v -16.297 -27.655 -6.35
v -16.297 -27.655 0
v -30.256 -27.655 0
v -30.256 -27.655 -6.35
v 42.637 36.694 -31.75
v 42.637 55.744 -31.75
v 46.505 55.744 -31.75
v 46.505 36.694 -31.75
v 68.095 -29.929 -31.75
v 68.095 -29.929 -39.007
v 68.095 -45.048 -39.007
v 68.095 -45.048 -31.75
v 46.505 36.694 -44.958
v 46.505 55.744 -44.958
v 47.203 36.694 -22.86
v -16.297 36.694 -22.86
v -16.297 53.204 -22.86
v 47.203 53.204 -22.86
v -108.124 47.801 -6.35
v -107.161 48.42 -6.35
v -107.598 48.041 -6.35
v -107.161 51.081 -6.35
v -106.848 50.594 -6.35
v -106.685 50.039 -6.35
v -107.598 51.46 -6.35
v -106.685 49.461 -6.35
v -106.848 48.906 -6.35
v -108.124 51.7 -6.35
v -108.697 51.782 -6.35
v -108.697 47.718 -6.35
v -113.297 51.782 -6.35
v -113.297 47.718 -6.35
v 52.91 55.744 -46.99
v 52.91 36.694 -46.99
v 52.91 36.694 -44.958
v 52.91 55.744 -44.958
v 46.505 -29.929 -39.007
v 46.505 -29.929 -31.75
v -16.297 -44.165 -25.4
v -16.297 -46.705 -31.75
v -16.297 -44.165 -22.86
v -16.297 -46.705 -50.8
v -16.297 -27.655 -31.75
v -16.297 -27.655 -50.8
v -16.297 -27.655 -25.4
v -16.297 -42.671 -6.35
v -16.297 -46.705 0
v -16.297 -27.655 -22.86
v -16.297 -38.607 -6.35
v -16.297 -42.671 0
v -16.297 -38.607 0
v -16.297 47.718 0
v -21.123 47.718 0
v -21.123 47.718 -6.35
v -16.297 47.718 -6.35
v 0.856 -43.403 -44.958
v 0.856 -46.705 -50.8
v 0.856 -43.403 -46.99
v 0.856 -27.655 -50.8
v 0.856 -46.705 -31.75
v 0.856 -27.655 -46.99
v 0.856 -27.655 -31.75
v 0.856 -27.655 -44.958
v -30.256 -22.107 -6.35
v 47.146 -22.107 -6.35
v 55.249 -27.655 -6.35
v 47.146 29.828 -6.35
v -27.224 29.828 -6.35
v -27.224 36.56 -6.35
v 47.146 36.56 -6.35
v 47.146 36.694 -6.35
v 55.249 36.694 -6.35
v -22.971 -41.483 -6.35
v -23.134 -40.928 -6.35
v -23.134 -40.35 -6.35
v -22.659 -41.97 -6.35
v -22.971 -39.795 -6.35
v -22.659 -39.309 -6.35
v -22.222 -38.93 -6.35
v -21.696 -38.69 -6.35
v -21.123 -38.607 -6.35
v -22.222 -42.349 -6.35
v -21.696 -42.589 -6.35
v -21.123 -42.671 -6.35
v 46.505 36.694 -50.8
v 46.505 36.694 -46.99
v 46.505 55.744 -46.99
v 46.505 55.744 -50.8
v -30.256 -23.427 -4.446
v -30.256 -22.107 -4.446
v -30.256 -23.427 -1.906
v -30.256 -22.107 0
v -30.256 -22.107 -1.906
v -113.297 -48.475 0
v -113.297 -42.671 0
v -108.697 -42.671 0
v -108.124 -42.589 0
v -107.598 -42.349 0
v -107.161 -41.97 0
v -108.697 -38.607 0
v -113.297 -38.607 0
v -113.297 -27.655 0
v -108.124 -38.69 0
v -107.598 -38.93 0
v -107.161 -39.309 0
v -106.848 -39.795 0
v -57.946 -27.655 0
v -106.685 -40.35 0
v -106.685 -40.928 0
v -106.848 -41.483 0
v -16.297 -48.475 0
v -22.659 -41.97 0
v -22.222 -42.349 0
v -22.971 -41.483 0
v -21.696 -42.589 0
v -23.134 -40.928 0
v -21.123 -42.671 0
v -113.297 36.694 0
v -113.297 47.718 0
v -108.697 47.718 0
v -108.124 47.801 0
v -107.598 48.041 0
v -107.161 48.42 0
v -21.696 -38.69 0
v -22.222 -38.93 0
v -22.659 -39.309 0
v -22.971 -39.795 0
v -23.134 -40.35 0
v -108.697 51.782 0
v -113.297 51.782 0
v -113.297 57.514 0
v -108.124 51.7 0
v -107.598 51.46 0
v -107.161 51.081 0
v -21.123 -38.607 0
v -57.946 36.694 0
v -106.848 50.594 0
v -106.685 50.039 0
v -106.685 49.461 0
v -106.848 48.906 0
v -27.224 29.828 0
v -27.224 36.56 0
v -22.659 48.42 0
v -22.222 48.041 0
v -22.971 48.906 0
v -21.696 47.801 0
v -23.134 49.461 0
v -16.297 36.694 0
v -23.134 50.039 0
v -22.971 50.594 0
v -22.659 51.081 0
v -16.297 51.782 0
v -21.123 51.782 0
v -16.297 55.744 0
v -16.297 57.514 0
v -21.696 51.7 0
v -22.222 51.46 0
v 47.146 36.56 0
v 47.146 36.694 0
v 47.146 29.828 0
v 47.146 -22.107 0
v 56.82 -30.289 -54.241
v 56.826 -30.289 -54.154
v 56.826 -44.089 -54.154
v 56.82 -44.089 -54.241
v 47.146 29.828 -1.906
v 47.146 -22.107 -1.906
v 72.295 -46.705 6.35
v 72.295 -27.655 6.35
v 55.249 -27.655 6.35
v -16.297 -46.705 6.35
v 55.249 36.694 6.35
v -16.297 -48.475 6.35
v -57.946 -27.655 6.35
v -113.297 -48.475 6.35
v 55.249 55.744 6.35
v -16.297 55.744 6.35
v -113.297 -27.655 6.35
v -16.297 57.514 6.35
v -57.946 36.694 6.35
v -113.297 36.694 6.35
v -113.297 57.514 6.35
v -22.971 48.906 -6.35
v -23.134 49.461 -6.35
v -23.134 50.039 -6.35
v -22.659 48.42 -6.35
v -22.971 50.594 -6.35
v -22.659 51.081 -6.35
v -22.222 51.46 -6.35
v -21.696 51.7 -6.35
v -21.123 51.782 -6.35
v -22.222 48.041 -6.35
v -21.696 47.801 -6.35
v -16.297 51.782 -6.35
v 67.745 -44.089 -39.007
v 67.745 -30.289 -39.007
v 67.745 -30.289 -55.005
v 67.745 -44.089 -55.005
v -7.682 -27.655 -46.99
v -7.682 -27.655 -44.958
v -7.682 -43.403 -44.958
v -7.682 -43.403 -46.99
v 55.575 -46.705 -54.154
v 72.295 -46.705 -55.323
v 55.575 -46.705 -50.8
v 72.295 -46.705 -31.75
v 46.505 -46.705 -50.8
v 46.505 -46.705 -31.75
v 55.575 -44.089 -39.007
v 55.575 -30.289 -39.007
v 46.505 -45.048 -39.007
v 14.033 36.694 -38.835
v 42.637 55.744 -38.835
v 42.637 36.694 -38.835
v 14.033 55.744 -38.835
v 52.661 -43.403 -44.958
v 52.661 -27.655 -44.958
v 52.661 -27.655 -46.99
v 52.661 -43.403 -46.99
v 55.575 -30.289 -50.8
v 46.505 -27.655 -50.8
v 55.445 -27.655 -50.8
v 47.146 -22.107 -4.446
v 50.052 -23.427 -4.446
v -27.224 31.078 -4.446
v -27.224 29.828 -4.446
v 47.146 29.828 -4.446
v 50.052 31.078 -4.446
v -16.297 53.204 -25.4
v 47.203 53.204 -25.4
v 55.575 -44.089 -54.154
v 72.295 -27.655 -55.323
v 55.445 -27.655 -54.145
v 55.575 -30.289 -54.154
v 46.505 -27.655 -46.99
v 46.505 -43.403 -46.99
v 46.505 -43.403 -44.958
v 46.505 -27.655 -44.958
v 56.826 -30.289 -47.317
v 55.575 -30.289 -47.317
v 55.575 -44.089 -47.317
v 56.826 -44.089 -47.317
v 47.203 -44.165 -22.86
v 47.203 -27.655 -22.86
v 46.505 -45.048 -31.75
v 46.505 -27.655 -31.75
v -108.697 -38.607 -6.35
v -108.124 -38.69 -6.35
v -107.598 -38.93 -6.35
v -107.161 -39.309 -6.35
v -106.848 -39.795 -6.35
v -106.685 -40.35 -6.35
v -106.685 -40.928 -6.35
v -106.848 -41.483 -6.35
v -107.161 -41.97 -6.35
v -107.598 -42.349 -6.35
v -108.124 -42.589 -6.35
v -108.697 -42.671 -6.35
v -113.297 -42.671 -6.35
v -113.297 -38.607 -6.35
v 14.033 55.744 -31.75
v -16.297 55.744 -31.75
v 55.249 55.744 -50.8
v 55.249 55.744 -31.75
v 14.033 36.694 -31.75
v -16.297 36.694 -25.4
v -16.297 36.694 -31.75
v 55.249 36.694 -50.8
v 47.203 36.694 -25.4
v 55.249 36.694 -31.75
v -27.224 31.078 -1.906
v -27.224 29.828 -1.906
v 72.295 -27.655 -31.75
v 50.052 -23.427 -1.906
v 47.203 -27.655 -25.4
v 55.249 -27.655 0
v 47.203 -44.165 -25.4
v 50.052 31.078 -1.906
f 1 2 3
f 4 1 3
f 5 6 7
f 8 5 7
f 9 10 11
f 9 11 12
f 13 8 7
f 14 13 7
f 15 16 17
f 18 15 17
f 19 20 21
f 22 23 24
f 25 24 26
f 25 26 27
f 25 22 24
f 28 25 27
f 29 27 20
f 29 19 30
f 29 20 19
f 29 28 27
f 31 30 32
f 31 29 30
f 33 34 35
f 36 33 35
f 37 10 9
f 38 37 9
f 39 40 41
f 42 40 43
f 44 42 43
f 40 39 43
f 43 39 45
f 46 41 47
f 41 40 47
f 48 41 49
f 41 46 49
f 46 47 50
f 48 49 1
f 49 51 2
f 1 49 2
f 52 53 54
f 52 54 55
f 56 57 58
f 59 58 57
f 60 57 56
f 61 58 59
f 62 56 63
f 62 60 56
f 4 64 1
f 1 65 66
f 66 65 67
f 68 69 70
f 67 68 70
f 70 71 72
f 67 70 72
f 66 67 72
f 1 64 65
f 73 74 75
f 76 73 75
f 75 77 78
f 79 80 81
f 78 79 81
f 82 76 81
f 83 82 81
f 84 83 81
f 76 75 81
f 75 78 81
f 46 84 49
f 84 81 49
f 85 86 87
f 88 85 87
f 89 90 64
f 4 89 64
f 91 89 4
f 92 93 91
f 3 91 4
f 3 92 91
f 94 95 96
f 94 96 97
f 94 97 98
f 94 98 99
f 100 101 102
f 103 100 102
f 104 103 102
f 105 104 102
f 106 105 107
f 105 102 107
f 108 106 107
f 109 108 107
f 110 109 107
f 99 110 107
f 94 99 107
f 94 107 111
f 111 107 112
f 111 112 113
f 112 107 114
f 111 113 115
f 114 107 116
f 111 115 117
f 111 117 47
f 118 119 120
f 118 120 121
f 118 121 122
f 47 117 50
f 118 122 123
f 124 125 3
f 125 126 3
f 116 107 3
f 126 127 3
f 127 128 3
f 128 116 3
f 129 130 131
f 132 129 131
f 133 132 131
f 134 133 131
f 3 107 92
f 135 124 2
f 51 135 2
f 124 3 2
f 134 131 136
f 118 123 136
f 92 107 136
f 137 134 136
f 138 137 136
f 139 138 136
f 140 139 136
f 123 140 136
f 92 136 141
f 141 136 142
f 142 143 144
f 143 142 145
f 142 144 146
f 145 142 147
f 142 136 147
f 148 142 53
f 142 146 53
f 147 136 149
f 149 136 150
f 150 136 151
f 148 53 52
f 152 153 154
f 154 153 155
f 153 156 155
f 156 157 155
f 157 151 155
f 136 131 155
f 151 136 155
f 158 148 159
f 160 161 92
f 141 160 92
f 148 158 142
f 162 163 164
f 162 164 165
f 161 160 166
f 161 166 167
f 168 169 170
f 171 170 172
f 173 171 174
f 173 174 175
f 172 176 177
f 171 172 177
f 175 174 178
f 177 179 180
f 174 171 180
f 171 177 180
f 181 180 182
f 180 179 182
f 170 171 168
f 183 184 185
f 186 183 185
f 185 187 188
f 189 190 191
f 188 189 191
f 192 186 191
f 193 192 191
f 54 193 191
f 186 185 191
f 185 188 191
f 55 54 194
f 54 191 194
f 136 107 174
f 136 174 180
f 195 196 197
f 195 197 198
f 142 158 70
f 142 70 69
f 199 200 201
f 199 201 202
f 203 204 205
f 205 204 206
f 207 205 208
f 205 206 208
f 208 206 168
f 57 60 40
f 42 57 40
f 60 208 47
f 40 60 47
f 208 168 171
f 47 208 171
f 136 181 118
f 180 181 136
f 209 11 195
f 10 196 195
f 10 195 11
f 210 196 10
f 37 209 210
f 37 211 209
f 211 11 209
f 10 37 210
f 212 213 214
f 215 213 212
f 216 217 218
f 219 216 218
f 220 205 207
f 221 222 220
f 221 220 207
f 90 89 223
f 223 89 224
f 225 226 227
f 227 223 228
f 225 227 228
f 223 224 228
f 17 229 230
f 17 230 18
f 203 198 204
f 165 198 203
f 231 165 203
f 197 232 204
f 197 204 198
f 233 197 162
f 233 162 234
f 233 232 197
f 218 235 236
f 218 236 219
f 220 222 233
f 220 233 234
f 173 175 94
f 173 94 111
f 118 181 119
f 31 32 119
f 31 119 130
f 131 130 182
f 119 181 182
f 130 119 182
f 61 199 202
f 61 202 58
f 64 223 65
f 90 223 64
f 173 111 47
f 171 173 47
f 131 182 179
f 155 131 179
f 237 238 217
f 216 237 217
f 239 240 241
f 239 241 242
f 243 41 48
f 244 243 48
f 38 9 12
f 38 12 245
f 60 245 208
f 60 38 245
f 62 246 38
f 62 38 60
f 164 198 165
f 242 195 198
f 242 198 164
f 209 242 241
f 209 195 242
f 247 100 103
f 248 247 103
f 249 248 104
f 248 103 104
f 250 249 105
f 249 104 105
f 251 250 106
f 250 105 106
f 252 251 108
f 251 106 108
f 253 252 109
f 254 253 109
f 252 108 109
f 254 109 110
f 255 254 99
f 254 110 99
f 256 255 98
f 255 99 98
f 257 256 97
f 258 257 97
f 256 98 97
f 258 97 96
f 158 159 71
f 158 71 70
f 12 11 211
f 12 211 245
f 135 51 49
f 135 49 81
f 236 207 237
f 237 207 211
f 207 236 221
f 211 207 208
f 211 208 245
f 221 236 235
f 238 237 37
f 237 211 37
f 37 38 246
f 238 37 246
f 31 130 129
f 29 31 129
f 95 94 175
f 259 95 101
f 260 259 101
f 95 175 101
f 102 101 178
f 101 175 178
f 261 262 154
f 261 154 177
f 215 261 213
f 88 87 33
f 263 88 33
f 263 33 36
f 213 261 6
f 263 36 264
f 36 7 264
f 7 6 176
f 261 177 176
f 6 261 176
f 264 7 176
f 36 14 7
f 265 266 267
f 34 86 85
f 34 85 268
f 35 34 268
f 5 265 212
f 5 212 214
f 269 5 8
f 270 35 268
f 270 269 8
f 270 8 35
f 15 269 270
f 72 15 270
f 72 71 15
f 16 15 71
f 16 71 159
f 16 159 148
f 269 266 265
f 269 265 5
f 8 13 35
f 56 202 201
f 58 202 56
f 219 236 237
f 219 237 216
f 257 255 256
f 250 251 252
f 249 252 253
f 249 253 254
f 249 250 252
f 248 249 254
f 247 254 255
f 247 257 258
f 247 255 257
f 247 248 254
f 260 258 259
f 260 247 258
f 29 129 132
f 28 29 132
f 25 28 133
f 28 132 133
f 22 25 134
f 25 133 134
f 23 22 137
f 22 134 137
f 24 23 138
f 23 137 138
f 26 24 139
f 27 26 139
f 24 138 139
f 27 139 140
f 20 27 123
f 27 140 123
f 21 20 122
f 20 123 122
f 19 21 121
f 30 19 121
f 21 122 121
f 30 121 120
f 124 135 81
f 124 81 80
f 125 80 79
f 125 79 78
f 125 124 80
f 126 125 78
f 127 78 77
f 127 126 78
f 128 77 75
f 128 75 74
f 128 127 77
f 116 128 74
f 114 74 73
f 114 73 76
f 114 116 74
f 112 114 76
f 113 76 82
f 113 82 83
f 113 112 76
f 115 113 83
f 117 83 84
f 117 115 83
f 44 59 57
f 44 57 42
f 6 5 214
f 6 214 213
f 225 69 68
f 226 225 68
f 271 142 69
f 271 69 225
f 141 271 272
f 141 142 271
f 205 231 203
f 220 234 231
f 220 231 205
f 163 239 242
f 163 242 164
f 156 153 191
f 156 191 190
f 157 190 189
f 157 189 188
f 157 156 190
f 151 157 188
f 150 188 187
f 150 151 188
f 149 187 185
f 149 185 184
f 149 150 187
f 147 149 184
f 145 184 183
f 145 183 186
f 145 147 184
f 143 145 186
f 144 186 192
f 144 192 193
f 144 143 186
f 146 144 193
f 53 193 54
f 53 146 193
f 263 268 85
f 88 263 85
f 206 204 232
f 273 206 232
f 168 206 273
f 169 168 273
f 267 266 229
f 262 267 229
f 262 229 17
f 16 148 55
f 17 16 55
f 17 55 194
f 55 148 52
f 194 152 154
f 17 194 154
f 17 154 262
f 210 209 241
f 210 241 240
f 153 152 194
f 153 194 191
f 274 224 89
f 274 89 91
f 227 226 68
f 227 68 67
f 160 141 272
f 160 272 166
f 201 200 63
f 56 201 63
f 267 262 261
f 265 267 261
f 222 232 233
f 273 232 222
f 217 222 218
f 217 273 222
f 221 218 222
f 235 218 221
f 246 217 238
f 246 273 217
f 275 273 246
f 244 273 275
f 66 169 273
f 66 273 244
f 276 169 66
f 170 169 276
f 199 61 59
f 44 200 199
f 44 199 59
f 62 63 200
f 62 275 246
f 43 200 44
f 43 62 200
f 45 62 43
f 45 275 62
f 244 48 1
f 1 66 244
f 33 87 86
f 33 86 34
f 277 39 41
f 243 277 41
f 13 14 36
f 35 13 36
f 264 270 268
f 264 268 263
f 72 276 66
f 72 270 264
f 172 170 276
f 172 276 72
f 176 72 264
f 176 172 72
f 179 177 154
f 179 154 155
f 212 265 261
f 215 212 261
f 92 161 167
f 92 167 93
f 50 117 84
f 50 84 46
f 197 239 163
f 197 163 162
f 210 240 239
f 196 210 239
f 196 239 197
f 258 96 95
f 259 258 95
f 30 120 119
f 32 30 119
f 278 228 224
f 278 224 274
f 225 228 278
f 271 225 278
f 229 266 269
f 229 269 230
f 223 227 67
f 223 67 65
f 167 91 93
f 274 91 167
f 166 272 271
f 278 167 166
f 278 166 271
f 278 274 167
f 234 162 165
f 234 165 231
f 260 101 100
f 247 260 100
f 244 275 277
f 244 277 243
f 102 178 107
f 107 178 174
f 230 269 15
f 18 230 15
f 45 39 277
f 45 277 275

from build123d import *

# Parameters (mm, degrees)
SKETCH2_W               = 113.195063652
SKETCH2_H               = 64.34953214
BOSS_EXTRUDE1_DEPTH     = 6.35
SKETCH6_W               = 71.546023985
SKETCH6_H               = 19.05
BOSS_EXTRUDE4_DEPTH     = 38.1
SKETCH8_W               = 2.54
SKETCH8_H               = 16.51
CUT_EXTRUDE1_DEPTH      = 63.5
SKETCH11_W              = 97
SKETCH11_H              = 20.82
BOSS_EXTRUDE8_DEPTH     = 6.35
BOSS_EXTRUDE13_DEPTH    = 6.35
BOSS_EXTRUDE14_DEPTH    = 6.35
BOSS_EXTRUDE15_DEPTH    = 6.35
BOSS_EXTRUDE16_DEPTH    = 6.35
SKETCH20_W              = 17.045853961
SKETCH20_H              = 19.05
BOSS_EXTRUDE17_DEPTH    = 38.1
BOSS_EXTRUDE18_REACH    = 134.649
BOSS_EXTRUDE19_DEPTH    = 13.8
SKETCH23_W              = 17.153547373
SKETCH23_H              = 19.05
SKETCH23_W_2            = 8.74383249
SKETCH23_W_3            = 9.06979052
BOSS_EXTRUDE20_DEPTH    = 19.05
SKETCH24_W              = 8.538975884
SKETCH24_H              = 2.032
SKETCH24_W_2            = 6.156345993
CUT_EXTRUDE2_DEPTH      = 15.748
SKETCH25_W              = 6.404810212
SKETCH25_H              = 2.032
CUT_EXTRUDE3_DEPTH      = 153.153507472
SKETCH26_W              = 28.603496075
SKETCH26_H              = 19.05
BOSS_EXTRUDE21_DEPTH    = 7.085056153
BOSS_EXTRUDE22_DEPTH    = 6.35
SKETCH30_W              = 2.54
SKETCH30_H              = 54.505544918
CUT_EXTRUDE4_DEPTH      = 77.978
CUT_EXTRUDE4_DEPTH_BACK = 2.905744
SKETCH32_W              = 7.257489736
SKETCH32_H              = 15.118119189
CUT_EXTRUDE5_DEPTH      = 21.59


with BuildPart() as part:
    # Sketch2 → Boss-Extrude1 (new body)
    with BuildSketch(Plane.XY):
        with Locations((-1.348571368, 4.519536632)):
            Rectangle(SKETCH2_W, SKETCH2_H)
    extrude(amount=BOSS_EXTRUDE1_DEPTH)

    # Sketch6 → Boss-Extrude4 (add)
    with BuildSketch(Plane.XY.offset(6.35)):
        with Locations((19.475948466, 46.219302702)):
            Rectangle(SKETCH6_W, SKETCH6_H)
        with Locations((19.475948466, -37.180229438)):
            Rectangle(SKETCH6_W, SKETCH6_H)
    extrude(amount=-BOSS_EXTRUDE4_DEPTH)

    # Sketch8 → Cut-Extrude1 (cut)
    with BuildSketch(Plane.ZY.offset(16.297063527)):
        with Locations((-24.13, 44.949302702)):
            Rectangle(SKETCH8_W, SKETCH8_H)
        with Locations((-24.13, -35.910229438)):
            Rectangle(SKETCH8_W, SKETCH8_H)
    extrude(amount=-CUT_EXTRUDE1_DEPTH, mode=Mode.SUBTRACT)

    # Sketch11 → Boss-Extrude8 (add)
    with BuildSketch(Plane.XY.offset(6.35)):
        with Locations((-64.797063527, 47.104302702)):
            Rectangle(SKETCH11_W, SKETCH11_H)
        with Locations((-64.797063527, -38.065229438)):
            Rectangle(SKETCH11_W, SKETCH11_H)
    extrude(amount=-BOSS_EXTRUDE8_DEPTH)

    # Sketch16 → Boss-Extrude13 (add)
    with BuildSketch(Plane(origin=(0, 0, 0), x_dir=(-1, 0, 0), z_dir=(0, 0, -1))):
        with BuildLine():
            Line((16.297063527, 51.782302702), (21.12307027, 51.782302702))
            ThreePointArc((21.12307027, 51.782302702), (23.15507027, 49.75029933), (21.123063527, 47.718302702))
            Line((21.123063527, 47.718302702), (16.297063527, 47.718302702))
            Line((16.297063527, 47.718302702), (16.297063527, 51.782302702))
        make_face()
    extrude(amount=BOSS_EXTRUDE13_DEPTH)

    # Sketch17 → Boss-Extrude14 (add)
    with BuildSketch(Plane(origin=(0, 0, 0), x_dir=(-1, 0, 0), z_dir=(0, 0, -1))):
        with BuildLine():
            Line((16.297063527, -38.607229438), (21.12307027, -38.607229438))
            ThreePointArc((21.12307027, -38.607229438), (23.15507027, -40.63923281), (21.123063527, -42.671229438))
            Line((21.123063527, -42.671229438), (16.297063527, -42.671229438))
            Line((16.297063527, -42.671229438), (16.297063527, -38.607229438))
        make_face()
    extrude(amount=BOSS_EXTRUDE14_DEPTH)

    # Sketch18 → Boss-Extrude15 (add)
    with BuildSketch(Plane(origin=(0, 0, 0), x_dir=(-1, 0, 0), z_dir=(0, 0, -1))):
        with BuildLine():
            Line((113.297063527, 51.782302702), (108.696564152, 51.782302702))
            ThreePointArc((108.696564152, 51.782302702), (106.664564152, 49.750302702), (108.696564152, 47.718302702))
            Line((108.696564152, 47.718302702), (113.297063527, 47.718302702))
            Line((113.297063527, 47.718302702), (113.297063527, 51.782302702))
        make_face()
    extrude(amount=BOSS_EXTRUDE15_DEPTH)

    # Sketch19 → Boss-Extrude16 (add)
    with BuildSketch(Plane(origin=(0, 0, 0), x_dir=(-1, 0, 0), z_dir=(0, 0, -1))):
        with BuildLine():
            Line((113.297063527, -38.607229438), (108.696564152, -38.607229438))
            ThreePointArc((108.696564152, -38.607229438), (106.664564152, -40.639229438), (108.696564152, -42.671229438))
            Line((108.696564152, -42.671229438), (113.297063527, -42.671229438))
            Line((113.297063527, -42.671229438), (113.297063527, -38.607229438))
        make_face()
    extrude(amount=BOSS_EXTRUDE16_DEPTH)

    # Sketch20 → Boss-Extrude17 (add)
    with BuildSketch(Plane(origin=(0, 0, -31.75), x_dir=(-1, 0, 0), z_dir=(0, 0, -1))):
        with Locations((-63.771887439, -37.180229438)):
            Rectangle(SKETCH20_W, SKETCH20_H)
    extrude(amount=-BOSS_EXTRUDE17_DEPTH)

    # Boss-Extrude18: up to this plane
    boss_extrude18_end = Plane(origin=(55.616772372, -37.189415156, -54.156592283), z_dir=(-0.06975647374413249, 0, -0.9975640502598238))
    # Sketch21 → Boss-Extrude18 (add, up to the surface)
    with BuildSketch(Plane(origin=(0, 0, -31.75), x_dir=(-1, 0, 0), z_dir=(0, 0, -1)), mode=Mode.PRIVATE) as boss_extrude18_sk1:
        Polygon((-55.445234397, -27.655229438), (-55.574918488, -30.289415156), (-67.745199901, -30.289415156), (-67.745199901, -44.089415156), (-55.574918488, -44.089415156), (-55.574918488, -46.705229438), (-72.294814419, -46.705229438), (-72.294814419, -27.655229438), align=None)
    boss_extrude18_tool1 = split(extrude(boss_extrude18_sk1.sketch, amount=BOSS_EXTRUDE18_REACH, mode=Mode.PRIVATE), bisect_by=boss_extrude18_end, keep=Keep.BOTH, mode=Mode.PRIVATE)
    add(boss_extrude18_tool1.solids().sort_by_distance((55.764094, -28.959817, -31.75))[0])

    # Sketch22 → Boss-Extrude19 (add)
    with BuildSketch(Plane.XZ.offset(30.289415156)):
        Polygon((55.574918488, -47.316538406), (56.82562534, -47.316538406), (56.82562534, -54.153665574), (56.819539444, -54.24069795), (55.574918488, -54.153665574), align=None)
    extrude(amount=BOSS_EXTRUDE19_DEPTH)

    # Sketch23 → Boss-Extrude20 (add)
    with BuildSketch(Plane(origin=(0, 0, -31.75), x_dir=(-1, 0, 0), z_dir=(0, 0, -1))):
        with Locations((7.720289841, -37.180229438)):
            Rectangle(SKETCH23_W, SKETCH23_H)
        with Locations((-50.877044213, 46.219302702)):
            Rectangle(SKETCH23_W_2, SKETCH23_H)
        with Locations((-51.040023228, -37.180229438)):
            Rectangle(SKETCH23_W_3, SKETCH23_H)
    extrude(amount=BOSS_EXTRUDE20_DEPTH)

    # Sketch24 → Cut-Extrude2 (cut)
    with BuildSketch(Plane(origin=(0, -27.655229438, 0), x_dir=(1, 0, 0), z_dir=(0, 1, 0))):
        with Locations((-3.413004096, 45.974)):
            Rectangle(SKETCH24_W, SKETCH24_H)
        with Locations((49.583300965, 45.974)):
            Rectangle(SKETCH24_W_2, SKETCH24_H)
    extrude(amount=-CUT_EXTRUDE2_DEPTH, mode=Mode.SUBTRACT)

    # Sketch25 → Cut-Extrude3 (cut, through all)
    with BuildSketch(Plane.XZ.offset(-36.694302702)):
        with Locations((49.707533074, -45.974)):
            Rectangle(SKETCH25_W, SKETCH25_H)
    extrude(amount=-CUT_EXTRUDE3_DEPTH, mode=Mode.SUBTRACT)

    # Sketch26 → Boss-Extrude21 (add)
    with BuildSketch(Plane(origin=(0, 0, -31.75), x_dir=(-1, 0, 0), z_dir=(0, 0, -1))):
        with Locations((-28.33506354, 46.219302702)):
            Rectangle(SKETCH26_W, SKETCH26_H)
    extrude(amount=BOSS_EXTRUDE21_DEPTH)

    # Sketch27 → Boss-Extrude22 (add)
    with BuildSketch(Plane(origin=(0, 0, 0), x_dir=(-1, 0, 0), z_dir=(0, 0, -1))):
        Polygon((-55.248960458, 36.694302702), (-47.14593274, 36.694302702), (-47.14593274, 36.56022062), (27.224261785, 36.56022062), (27.224261785, 29.827699057), (-47.14593274, 29.827699057), (-47.14593274, -22.106759253), (30.255968743, -22.106759253), (30.255968743, -27.655229438), (-47.14593274, -27.655229438), (-55.248960458, -27.655229438), align=None)
    extrude(amount=BOSS_EXTRUDE22_DEPTH)

    # Sketch30 → Cut-Extrude4 (cut, two sides)
    with BuildSketch(Plane.ZY.offset(-47.14593274)) as cut_extrude4_sk:
        with Locations((-3.17615729, 3.825374341)):
            Rectangle(SKETCH30_W, SKETCH30_H)
    extrude(amount=CUT_EXTRUDE4_DEPTH, mode=Mode.SUBTRACT)
    extrude(cut_extrude4_sk.sketch, amount=-CUT_EXTRUDE4_DEPTH_BACK, mode=Mode.SUBTRACT)

    # Sketch32 → Cut-Extrude5 (cut)
    with BuildSketch(Plane.ZY.offset(-46.505127968)):
        with Locations((-35.378744868, -37.488489942)):
            Rectangle(SKETCH32_W, SKETCH32_H)
    extrude(amount=-CUT_EXTRUDE5_DEPTH, mode=Mode.SUBTRACT)


solid = part.part
